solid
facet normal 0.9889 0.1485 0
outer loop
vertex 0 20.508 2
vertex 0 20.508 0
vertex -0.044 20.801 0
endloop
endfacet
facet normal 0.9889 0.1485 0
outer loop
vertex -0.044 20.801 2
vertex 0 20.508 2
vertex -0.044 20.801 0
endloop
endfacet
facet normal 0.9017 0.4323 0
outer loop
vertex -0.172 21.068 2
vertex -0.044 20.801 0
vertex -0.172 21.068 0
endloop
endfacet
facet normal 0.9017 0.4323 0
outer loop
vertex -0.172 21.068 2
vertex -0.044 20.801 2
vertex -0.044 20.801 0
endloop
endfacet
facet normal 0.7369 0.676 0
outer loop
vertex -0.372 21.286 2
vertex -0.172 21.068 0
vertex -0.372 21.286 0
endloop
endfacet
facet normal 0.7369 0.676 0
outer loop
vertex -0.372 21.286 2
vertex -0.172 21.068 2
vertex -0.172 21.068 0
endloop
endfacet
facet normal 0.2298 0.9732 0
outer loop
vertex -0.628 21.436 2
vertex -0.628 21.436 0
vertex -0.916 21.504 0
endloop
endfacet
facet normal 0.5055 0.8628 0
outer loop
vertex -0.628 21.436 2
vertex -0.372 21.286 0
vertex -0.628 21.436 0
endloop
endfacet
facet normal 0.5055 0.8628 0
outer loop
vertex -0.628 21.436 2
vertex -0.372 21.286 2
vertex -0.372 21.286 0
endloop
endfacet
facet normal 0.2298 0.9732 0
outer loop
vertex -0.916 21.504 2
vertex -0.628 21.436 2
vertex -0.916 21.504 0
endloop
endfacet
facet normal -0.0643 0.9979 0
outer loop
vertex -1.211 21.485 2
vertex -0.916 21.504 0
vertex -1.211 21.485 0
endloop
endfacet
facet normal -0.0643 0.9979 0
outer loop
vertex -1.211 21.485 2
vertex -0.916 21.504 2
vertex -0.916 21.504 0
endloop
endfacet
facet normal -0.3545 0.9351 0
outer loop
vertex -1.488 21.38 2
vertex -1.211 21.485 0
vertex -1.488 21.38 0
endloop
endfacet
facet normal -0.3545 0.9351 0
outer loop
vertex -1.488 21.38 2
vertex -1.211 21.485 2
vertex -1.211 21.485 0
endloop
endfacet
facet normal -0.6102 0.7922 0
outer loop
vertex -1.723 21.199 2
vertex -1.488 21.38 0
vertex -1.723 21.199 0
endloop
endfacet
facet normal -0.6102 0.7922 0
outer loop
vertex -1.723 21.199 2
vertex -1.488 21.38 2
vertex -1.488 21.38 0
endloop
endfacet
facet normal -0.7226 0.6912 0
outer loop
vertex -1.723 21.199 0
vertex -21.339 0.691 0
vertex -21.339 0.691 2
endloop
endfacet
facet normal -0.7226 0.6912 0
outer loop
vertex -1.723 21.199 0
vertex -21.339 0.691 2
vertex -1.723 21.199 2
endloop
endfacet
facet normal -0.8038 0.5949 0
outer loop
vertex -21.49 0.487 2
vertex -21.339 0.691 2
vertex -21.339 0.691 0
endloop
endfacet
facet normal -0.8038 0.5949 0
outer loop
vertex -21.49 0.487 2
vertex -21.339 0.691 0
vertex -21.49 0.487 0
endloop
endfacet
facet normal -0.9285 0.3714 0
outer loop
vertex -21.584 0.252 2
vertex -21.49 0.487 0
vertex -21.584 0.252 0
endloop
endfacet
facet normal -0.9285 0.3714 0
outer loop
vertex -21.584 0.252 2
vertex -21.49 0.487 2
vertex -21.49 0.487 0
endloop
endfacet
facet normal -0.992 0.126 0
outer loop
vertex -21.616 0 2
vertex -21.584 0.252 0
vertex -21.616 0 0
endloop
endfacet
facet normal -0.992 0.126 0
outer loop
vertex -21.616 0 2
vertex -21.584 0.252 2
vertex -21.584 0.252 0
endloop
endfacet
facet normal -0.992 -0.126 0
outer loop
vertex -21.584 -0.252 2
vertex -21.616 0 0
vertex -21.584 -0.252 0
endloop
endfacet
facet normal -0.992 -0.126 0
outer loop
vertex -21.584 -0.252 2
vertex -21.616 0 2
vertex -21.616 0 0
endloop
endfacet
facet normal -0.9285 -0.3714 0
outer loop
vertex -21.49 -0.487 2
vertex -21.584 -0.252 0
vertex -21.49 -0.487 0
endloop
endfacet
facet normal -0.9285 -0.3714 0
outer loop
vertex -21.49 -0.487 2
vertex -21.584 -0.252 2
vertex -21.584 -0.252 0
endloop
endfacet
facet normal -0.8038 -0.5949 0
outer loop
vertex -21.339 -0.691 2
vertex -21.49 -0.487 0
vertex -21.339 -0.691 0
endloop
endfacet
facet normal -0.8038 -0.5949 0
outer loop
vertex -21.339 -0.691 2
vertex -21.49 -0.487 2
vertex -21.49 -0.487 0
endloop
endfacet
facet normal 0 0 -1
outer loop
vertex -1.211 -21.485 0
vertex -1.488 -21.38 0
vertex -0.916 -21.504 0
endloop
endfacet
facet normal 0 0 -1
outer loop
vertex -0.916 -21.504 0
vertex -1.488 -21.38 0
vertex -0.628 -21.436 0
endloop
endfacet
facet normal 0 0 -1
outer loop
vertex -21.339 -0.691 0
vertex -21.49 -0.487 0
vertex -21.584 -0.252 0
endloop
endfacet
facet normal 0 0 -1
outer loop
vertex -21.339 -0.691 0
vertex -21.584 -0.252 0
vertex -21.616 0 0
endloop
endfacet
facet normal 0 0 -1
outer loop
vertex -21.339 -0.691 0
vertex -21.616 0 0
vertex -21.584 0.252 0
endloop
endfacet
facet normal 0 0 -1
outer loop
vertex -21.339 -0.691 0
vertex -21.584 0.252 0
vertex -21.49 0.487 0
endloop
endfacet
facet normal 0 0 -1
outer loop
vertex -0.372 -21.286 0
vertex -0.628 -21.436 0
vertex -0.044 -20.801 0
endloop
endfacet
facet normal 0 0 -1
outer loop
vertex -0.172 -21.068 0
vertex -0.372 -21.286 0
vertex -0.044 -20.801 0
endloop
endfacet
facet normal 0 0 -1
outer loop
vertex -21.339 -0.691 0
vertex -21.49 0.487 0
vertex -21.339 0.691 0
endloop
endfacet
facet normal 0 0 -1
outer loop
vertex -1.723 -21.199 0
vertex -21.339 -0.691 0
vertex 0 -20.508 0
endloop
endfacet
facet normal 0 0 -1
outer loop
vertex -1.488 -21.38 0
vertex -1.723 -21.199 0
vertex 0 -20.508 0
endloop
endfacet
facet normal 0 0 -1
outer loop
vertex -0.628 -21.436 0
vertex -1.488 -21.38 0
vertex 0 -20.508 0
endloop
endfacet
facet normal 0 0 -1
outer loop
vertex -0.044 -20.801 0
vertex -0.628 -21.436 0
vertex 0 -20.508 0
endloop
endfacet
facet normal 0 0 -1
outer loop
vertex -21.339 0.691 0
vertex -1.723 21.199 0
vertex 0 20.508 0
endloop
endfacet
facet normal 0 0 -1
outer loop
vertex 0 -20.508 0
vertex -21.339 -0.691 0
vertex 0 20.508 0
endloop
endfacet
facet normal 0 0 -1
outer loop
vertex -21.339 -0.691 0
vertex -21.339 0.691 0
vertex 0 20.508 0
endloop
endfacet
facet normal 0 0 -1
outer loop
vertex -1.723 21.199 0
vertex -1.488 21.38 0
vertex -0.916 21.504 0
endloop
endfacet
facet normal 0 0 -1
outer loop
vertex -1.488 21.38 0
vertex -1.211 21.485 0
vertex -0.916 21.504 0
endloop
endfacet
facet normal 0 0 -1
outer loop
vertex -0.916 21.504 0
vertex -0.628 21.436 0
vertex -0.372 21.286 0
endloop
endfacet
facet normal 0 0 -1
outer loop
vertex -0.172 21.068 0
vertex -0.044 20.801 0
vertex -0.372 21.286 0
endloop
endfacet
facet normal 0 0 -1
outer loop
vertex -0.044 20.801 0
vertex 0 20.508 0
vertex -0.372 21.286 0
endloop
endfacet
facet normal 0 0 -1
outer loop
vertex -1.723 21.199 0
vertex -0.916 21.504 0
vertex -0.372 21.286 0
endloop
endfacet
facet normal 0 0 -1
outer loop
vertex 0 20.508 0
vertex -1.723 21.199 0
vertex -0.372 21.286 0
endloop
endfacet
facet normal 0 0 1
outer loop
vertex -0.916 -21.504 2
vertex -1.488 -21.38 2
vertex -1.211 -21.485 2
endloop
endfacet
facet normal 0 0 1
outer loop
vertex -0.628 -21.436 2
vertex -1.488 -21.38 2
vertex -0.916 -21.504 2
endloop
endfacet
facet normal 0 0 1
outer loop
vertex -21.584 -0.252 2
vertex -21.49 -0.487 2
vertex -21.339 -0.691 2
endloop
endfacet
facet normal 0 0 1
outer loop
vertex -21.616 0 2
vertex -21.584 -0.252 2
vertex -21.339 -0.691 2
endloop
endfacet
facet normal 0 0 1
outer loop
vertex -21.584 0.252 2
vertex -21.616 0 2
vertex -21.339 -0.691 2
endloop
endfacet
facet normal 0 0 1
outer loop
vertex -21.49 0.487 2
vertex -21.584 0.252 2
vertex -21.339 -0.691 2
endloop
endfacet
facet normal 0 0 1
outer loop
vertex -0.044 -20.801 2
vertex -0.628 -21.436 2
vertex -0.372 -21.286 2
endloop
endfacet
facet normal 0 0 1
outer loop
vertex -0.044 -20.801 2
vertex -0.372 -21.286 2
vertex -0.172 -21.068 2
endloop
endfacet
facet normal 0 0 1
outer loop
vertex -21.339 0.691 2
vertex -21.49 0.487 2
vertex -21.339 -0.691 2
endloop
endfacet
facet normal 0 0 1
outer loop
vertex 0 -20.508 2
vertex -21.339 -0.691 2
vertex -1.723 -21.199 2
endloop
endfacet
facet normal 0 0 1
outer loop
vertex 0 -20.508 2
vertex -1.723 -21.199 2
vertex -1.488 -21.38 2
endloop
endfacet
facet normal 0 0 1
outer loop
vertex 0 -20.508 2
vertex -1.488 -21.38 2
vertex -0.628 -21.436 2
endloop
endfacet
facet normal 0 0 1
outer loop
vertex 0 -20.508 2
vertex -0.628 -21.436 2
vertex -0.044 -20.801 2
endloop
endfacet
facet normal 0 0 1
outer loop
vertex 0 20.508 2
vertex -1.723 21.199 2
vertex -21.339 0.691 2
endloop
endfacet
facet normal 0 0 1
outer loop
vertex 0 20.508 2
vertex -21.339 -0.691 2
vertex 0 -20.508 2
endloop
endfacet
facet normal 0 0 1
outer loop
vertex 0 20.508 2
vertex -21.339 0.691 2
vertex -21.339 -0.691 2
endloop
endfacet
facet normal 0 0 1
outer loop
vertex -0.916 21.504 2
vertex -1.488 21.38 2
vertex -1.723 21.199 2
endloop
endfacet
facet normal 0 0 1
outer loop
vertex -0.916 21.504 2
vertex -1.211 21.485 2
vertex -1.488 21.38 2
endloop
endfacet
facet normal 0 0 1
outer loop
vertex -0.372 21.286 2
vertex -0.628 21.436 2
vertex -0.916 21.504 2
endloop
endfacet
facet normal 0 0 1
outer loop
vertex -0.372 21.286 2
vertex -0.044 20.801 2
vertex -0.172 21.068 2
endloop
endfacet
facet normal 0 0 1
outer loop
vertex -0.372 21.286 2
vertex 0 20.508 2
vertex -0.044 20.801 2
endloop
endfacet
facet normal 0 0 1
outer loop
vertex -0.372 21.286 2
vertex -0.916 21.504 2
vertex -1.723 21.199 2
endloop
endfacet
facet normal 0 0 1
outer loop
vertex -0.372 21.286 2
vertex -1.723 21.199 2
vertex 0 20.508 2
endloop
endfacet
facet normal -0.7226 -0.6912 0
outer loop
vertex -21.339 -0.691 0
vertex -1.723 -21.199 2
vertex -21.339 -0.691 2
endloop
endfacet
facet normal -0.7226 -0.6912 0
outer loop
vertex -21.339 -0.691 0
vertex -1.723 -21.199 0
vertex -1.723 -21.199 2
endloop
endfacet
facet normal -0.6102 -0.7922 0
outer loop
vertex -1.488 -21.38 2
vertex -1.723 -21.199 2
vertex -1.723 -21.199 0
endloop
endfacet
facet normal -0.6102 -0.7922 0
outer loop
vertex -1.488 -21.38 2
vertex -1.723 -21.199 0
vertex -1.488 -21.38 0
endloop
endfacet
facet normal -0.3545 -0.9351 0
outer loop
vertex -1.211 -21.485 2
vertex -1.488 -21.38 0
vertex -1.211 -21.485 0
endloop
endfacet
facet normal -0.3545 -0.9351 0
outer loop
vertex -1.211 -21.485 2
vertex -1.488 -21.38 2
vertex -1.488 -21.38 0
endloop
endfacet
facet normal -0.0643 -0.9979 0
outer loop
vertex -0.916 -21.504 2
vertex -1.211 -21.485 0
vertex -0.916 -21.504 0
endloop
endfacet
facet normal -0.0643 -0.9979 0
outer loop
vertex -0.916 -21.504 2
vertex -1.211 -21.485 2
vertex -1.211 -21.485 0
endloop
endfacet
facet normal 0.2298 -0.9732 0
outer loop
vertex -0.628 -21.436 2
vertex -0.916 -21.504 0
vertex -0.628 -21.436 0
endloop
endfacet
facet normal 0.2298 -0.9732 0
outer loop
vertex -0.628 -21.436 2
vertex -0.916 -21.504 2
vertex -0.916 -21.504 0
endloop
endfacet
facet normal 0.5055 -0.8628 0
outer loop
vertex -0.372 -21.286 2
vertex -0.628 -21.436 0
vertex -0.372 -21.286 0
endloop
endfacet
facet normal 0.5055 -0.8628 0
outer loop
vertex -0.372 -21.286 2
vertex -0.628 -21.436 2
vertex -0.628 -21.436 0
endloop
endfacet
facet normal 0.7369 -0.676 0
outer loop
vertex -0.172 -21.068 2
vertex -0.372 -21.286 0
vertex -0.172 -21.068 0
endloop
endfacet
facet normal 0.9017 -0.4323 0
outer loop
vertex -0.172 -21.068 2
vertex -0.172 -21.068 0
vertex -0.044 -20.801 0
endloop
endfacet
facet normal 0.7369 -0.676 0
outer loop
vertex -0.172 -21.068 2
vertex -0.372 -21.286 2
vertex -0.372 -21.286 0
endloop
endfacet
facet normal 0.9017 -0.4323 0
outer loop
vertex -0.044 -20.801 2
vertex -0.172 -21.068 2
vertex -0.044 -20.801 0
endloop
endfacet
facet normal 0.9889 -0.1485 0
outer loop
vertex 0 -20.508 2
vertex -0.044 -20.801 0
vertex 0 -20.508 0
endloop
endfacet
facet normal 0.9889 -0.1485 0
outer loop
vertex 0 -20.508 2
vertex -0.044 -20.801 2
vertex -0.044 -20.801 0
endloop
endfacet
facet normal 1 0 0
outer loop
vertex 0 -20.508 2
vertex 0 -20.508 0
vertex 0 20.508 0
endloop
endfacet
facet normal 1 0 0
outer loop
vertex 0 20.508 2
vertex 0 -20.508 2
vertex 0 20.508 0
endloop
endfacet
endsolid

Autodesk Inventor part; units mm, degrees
ref_plane "YZ Plane" through (0, 0, 0) normal (1, 0, 0) x (0, 1, 0)
ref_plane "XZ Plane" through (0, 0, 0) normal (0, 1, 0) x (-1, 0, 0)
ref_plane "XY Plane" through (0, 0, 0) normal (0, 0, 1) x (1, 0, 0)
sketch "Sketch1" plane through (0, 0, 0) normal (0, 0, 1) x (1, 0, 0)
  line L0 (0, -23) -> (0, 23)
  line L1 (0, -23) -> (-22, 0)
  line L2 (-22, 0) -> (0, 23)
  point P0 (0, 0)
  point P1 (0, 0)
  point P2 (0, 0)
  dimension "d1" = 46
  dimension "d9" = 22
extrude "Plate1" add sketch "Sketch1" along normal blind 2
fillet "Corner Round2" radius 1 3 edges at (0, -23, 1) (-22, 0, 1) (0, 23, 1)
equation "\"d2\" = Thickness"
equation "\"BendReliefWidth\" = Thickness"
equation "\"BendReliefDepth\" = 0.5 * Thickness"
equation "\"CornerReliefSize\" = 4 * Thickness"
equation "\"MinimumRemnant\" = 2 * Thickness"
equation "\"TransitionRadius\" = BendRadius"
equation "\"JacobiRadiusSize\" = BendRadius"
equation "\"GapSize\" = Thickness"
equation "\"Thickness\" = 2"
equation "\"BendRadius\" = 2.75"
properties part number "MNT-CDF-605 CAP" material "Stainless Steel"
